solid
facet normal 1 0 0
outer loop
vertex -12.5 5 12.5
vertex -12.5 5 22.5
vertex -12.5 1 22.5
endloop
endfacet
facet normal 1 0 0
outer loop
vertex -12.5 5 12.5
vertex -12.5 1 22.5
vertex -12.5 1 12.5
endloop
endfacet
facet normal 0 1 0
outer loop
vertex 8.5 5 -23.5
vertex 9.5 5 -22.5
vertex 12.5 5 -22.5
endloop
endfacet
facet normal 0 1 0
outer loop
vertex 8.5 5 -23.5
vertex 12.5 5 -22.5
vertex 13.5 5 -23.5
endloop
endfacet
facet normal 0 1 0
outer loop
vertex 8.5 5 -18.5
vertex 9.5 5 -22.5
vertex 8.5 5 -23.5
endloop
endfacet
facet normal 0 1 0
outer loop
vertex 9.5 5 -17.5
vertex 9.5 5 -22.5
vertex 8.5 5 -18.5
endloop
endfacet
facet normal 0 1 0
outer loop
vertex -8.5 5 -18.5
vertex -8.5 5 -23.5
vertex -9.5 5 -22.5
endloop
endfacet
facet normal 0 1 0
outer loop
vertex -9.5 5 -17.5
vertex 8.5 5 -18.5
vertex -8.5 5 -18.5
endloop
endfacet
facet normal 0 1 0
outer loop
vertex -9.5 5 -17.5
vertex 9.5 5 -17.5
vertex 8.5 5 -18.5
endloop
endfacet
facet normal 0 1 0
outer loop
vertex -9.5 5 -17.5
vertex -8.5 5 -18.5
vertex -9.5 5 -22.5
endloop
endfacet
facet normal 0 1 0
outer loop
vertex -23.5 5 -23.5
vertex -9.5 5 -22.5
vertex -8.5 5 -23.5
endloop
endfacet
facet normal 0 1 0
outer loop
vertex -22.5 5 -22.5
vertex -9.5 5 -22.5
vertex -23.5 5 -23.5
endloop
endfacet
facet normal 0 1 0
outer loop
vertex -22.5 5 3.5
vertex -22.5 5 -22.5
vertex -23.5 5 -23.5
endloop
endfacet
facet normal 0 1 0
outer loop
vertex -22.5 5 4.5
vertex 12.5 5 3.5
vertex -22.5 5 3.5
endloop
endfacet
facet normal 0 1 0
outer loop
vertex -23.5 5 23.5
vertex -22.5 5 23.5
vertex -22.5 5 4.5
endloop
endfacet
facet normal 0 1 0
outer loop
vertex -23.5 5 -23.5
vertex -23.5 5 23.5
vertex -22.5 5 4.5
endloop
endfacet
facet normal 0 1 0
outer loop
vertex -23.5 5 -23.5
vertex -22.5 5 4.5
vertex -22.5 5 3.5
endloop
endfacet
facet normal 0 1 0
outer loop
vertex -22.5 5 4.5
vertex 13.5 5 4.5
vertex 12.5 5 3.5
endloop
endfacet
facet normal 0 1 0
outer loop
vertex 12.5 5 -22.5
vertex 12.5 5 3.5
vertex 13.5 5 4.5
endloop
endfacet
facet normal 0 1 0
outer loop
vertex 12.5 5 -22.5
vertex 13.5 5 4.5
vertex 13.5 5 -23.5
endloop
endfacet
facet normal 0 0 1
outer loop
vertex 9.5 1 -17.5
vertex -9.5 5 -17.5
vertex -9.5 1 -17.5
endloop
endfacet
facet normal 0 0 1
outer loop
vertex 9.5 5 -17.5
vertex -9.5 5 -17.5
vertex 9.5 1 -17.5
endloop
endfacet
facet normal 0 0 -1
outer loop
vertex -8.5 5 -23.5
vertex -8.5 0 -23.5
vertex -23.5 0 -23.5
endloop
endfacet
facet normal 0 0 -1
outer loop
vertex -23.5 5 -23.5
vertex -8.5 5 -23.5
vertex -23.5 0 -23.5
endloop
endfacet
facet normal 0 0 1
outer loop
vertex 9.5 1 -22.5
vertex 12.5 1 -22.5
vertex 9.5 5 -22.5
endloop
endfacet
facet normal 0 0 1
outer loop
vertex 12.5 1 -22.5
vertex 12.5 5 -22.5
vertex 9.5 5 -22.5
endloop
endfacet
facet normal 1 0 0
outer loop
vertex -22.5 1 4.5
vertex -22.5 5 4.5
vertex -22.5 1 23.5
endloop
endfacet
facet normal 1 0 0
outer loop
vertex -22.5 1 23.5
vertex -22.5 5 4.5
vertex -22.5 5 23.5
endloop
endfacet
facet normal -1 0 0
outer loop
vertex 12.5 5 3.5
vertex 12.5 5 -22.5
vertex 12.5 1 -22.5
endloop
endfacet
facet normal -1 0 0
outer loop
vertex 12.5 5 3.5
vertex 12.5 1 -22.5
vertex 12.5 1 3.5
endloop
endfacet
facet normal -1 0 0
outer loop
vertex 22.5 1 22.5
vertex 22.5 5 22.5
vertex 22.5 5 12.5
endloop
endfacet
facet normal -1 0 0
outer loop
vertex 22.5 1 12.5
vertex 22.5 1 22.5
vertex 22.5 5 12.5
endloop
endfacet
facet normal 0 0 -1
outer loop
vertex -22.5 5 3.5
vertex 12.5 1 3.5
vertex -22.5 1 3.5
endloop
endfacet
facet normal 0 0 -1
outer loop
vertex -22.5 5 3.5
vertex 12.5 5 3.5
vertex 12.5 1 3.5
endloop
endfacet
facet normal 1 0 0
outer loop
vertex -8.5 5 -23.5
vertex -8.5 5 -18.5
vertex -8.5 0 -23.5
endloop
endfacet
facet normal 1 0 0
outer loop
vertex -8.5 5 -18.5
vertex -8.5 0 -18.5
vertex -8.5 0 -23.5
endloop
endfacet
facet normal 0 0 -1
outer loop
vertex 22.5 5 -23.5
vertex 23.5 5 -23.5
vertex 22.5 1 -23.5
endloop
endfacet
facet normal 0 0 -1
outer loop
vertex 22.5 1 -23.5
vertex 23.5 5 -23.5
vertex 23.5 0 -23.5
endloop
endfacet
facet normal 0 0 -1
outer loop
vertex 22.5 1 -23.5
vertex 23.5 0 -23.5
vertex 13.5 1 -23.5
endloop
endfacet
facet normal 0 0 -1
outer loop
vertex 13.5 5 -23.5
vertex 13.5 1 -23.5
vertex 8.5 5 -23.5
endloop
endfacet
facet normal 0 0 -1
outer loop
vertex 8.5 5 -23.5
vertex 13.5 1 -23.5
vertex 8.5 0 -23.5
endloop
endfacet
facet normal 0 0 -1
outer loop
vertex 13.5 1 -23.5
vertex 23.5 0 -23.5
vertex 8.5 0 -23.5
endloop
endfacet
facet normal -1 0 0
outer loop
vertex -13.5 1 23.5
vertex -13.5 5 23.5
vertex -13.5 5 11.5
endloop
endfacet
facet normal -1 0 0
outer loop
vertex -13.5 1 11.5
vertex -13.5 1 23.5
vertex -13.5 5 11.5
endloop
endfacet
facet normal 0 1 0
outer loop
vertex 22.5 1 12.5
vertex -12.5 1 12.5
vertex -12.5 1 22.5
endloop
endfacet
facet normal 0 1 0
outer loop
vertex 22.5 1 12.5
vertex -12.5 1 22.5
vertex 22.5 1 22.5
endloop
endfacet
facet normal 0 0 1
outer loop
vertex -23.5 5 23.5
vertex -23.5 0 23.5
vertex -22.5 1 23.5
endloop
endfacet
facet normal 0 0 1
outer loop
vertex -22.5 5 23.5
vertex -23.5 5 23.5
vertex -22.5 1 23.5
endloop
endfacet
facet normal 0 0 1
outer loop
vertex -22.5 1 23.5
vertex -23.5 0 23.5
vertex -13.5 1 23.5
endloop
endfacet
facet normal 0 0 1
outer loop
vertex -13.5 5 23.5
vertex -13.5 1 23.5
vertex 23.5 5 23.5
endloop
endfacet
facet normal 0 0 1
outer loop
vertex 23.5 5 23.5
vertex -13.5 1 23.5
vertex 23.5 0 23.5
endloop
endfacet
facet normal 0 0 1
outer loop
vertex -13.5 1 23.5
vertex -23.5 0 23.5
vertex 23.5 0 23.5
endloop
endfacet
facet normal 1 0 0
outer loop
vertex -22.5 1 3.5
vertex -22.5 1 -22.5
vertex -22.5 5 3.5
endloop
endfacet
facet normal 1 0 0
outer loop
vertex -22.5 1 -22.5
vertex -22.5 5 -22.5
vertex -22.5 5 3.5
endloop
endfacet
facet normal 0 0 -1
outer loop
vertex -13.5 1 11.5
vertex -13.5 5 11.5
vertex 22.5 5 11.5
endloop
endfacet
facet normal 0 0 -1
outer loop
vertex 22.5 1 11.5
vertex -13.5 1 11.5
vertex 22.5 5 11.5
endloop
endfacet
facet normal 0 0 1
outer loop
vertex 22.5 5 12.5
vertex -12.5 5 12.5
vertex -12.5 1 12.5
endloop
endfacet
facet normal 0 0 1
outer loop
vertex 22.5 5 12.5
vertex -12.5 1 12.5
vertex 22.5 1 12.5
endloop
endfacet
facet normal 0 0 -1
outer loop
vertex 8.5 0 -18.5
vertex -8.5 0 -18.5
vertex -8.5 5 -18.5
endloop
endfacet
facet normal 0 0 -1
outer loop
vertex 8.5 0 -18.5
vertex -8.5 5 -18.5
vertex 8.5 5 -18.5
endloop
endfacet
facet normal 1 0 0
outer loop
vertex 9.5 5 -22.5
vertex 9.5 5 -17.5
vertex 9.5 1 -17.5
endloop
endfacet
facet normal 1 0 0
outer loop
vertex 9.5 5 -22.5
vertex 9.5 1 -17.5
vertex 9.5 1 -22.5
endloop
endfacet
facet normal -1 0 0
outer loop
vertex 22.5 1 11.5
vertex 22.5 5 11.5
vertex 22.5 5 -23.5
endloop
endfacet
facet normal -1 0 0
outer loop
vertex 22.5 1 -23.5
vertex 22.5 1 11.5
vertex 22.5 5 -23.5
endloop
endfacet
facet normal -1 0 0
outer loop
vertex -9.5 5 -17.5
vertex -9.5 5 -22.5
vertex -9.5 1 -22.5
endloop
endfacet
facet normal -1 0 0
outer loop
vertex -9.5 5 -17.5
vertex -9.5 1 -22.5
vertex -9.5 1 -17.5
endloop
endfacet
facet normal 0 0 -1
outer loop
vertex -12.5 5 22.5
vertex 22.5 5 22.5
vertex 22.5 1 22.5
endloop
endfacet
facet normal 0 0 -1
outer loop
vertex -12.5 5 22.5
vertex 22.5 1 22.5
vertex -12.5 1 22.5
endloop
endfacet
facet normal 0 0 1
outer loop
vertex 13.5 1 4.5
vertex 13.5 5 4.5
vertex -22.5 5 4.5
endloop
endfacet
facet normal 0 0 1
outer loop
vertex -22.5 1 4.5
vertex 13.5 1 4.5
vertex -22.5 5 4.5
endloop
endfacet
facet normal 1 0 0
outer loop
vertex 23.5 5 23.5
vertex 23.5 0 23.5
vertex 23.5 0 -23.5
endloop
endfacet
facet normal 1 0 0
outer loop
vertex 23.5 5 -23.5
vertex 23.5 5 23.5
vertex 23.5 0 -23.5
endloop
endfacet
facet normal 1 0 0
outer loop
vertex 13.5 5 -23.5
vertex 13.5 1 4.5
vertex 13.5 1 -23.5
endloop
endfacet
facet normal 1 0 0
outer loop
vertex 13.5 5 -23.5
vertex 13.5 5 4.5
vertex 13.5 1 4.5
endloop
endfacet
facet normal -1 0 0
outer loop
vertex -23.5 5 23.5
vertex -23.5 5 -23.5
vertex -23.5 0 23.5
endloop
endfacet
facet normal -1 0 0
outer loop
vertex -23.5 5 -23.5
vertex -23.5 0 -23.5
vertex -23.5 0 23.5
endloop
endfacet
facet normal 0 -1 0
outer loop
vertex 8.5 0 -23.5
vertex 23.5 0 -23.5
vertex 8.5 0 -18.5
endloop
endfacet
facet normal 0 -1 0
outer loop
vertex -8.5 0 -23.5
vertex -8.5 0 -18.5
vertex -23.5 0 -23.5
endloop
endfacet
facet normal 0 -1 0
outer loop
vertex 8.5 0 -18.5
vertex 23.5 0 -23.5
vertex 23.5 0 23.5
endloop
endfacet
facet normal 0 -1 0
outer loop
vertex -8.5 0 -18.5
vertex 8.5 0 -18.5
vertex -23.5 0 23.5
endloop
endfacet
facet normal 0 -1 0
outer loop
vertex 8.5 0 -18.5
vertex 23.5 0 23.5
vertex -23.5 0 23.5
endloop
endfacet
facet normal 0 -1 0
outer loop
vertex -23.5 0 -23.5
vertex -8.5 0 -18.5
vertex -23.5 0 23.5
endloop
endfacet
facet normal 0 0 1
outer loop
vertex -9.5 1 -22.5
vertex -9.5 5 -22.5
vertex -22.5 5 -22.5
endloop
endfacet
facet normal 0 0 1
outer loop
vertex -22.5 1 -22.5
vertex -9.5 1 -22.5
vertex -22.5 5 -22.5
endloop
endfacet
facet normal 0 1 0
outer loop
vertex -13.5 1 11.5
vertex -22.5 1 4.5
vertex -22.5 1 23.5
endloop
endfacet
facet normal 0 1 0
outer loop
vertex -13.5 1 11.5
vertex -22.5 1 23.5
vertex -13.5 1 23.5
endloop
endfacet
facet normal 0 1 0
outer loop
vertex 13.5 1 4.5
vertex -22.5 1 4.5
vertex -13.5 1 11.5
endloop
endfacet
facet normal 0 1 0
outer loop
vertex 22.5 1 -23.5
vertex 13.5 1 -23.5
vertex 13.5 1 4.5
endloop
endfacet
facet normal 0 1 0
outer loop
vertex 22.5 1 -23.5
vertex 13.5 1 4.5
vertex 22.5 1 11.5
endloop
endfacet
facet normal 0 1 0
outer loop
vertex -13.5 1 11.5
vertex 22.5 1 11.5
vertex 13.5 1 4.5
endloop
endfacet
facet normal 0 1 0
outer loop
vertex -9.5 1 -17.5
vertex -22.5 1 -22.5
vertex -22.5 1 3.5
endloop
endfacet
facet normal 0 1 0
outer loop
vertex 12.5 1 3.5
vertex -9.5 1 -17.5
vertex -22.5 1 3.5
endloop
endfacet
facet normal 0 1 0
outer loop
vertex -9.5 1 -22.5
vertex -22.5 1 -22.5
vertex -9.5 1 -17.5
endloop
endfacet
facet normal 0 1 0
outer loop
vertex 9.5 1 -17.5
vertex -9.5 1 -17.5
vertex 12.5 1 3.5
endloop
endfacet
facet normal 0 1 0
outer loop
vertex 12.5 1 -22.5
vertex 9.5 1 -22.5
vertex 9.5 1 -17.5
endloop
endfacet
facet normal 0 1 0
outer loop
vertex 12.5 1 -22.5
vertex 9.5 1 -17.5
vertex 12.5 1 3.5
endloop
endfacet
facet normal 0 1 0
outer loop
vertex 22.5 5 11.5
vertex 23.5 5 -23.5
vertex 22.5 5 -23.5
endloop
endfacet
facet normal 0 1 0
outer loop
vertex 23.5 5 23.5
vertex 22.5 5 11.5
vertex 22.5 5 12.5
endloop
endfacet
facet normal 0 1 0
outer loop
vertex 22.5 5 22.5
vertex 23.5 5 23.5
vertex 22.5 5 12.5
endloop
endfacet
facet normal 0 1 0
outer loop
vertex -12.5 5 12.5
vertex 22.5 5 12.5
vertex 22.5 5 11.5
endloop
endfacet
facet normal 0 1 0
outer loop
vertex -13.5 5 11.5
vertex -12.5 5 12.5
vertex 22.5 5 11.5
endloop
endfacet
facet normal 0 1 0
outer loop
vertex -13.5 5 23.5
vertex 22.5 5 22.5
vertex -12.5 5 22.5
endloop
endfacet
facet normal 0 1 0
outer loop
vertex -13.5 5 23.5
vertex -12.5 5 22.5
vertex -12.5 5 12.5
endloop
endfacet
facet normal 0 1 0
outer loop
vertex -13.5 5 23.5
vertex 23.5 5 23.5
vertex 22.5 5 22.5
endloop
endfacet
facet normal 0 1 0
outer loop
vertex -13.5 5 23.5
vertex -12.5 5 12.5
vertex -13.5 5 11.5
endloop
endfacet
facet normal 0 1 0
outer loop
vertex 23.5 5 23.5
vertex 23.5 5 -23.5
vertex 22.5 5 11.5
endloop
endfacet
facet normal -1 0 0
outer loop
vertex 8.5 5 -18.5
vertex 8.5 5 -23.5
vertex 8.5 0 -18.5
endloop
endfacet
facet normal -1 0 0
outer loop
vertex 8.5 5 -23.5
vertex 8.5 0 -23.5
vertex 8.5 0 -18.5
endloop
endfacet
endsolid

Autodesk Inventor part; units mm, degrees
ref_plane "YZ Plane" through (0, 0, 0) normal (1, 0, 0) x (0, 1, 0)
ref_plane "XZ Plane" through (0, 0, 0) normal (0, 1, 0) x (-1, 0, 0)
ref_plane "XY Plane" through (0, 0, 0) normal (0, 0, 1) x (1, 0, 0)
sketch "Sketch1" plane through (0, 0, 0) normal (0, 1, 0) x (-1, 0, 0)
  point P0 (0, 0)
sketch "Sketch2" plane through (0, 0, 0) normal (0, 1, 0) x (-1, 0, 0)
  line L0 (23.5, 23.5) -> (-23.5, 23.5)
  line L1 (-23.5, 23.5) -> (-23.5, -23.5)
  line L2 (23.5, -23.5) -> (23.5, 23.5)
  line L3 (8.5, -18.5) -> (-8.5, -18.5)
  line L4 (-8.5, -23.5) -> (-8.5, -18.5)
  line L5 (8.5, -18.5) -> (8.5, -23.5)
  line L6 (-23.5, -23.5) -> (-8.5, -23.5)
  line L7 (8.5, -23.5) -> (23.5, -23.5)
  point P0 (0, 0)
  dimension "d4" = 47
  dimension "d5" = 47
  dimension "d7" = 23.5
  dimension "d41" = 15
  dimension "d42" = 15
extrude "Extrusion1" add sketch "Sketch2" along normal blind 5
sketch "Sketch3" plane through (0, 5, 0) normal (0, 1, 0) x (1, 0, 0)
  point P0 (0, 0)
sketch "Sketch4" plane through (0, 5, 0) normal (0, 1, 0) x (1, 0, 0)
  line L0 (22.5, -22.5) -> (22.5, 22.5)
  line L1 (-22.5, 22.5) -> (-22.5, -31.5)
  line L2 (22.5, 22.5) -> (13.5356, 22.5)
  line L3 (22.5, 11) -> (22.5, 22.5)
  line L4 (13.5, -4.5) -> (-22.5, -4.5)
  line L5 (-22.5, -4.5) -> (-22.5, -23.5)
  line L6 (-23.5, 23.5) -> (-23.5, -23.5) projected
  line L7 (-22.5, -23.5) -> (-13.5, -23.5)
  line L8 (-13.5, -23.5) -> (-13.5, -11.5)
  line L9 (-13.5, -11.5) -> (22.5, -11.5)
  line L10 (13.5, -4.5) -> (13.5, 23.5)
  line L11 (13.5, 23.5) -> (22.5, 23.5)
  line L12 (22.5, 23.5) -> (22.5, -11.5)
  line L13 (22.5, -22.5) -> (-12.5, -22.5)
  line L14 (-12.5, -22.5) -> (-12.5, -12.5)
  line L15 (-12.5, -12.5) -> (22.5, -12.5)
  line L16 (22.5, -12.5) -> (22.5, -22.5)
  line L17 (12.5, 22.5) -> (12.5, -3.5)
  line L18 (12.5, -3.5) -> (-22.5, -3.5)
  line L19 (-22.5, -3.5) -> (-22.5, 22.5)
  line L20 (-9.5, 22.5) -> (-9.5, 17.5)
  line L21 (-9.5, 17.5) -> (9.5, 17.5)
  line L22 (9.5, 17.5) -> (9.5, 22.5)
  line L23 (-8.5, 18.5) -> (-8.5, 23.5) projected
  line L24 (8.5, 23.5) -> (8.5, 18.5) projected
  line L25 (22.5, 22.5) -> (8.5, 22.5)
  line L26 (-8.5, 22.5) -> (-22.5, 22.5)
  line L27 (-22.5, 22.5) -> (-8.5, 22.5)
  line L28 (8.5, 22.5) -> (12.5, 22.5)
  line L29 (-5, -3.5) -> (-20.0496, -3.5)
  line L30 (-20.0496, -3.5) -> (-20.0496, 2.4851)
  line L31 (-20.0496, 2.4851) -> (-5, 2.4851)
  line L32 (-5, 2.4851) -> (-5, -3.5)
  line L33 (-23.5, -23.5) -> (23.5, -23.5) projected
  line L34 (23.5, 23.5) -> (8.5, 23.5) projected
  point P0 (0, 0)
  point P1 (22.5, 22.5)
  point P2 (22.5, -12.5)
  point P3 (-22.5, -3.5)
  point P4 (-9.5, 20)
  point P5 (8.5, 21)
  point P6 (12.5, 22.5)
  point P7 (13.5, 22.5)
  point P8 (9.5, 22.5)
  point P9 (22.5, 22.5)
  point P10 (10.5, 22.5)
  dimension "d10" = 45
  dimension "d13" = 22.5
  dimension "d33" = 9
  dimension "d36" = 1
  dimension "d38" = 1
  dimension "d39" = 1
  dimension "d43" = 5
  dimension "d44" = 1
  dimension "d45" = 1
  dimension "d50" = 1
  dimension "d51" = 11
  dimension "d52" = 18
  dimension "d53" = 1
  dimension "d54" = 1
extrude "Extrusion5" cut sketch "Sketch4" against normal blind 4 contours L13 L14 L15 L0 | L9 L8 L7 L1 L4 L10 L25 L2 L0 | L2 L25 L10 L11 L12 | L17 L18 L32 L31 L30 L1 L26 L20 L21 L22 L25 | L30 L31 L32 L18
sketch "PD placement" plane through (0, 1, 0) normal (0, 1, 0) x (1, 0, 0)
  line L0 (-4.5, -10.5) -> (0, -10.5)
  line L1 (0, -10.5) -> (0, -5)
  line L2 (0, -5) -> (-4.5, -5)
  line L3 (-4.5, -5) -> (-4.5, -10.5)
  line L4 (22.5, -22.5) -> (-12.5, -22.5) projected
  line L5 (22.5, 23.5) -> (22.5, -11.5) projected
  line L6 (-22.5, -23.5) -> (-22.5, -4.5) projected
  point P0 (0, 0)
  dimension "d55" = 4.5
  dimension "d56" = 5.5
  dimension "d57" = 12
  dimension "d59" = 18
properties part number "particle_sensor_case_top"
